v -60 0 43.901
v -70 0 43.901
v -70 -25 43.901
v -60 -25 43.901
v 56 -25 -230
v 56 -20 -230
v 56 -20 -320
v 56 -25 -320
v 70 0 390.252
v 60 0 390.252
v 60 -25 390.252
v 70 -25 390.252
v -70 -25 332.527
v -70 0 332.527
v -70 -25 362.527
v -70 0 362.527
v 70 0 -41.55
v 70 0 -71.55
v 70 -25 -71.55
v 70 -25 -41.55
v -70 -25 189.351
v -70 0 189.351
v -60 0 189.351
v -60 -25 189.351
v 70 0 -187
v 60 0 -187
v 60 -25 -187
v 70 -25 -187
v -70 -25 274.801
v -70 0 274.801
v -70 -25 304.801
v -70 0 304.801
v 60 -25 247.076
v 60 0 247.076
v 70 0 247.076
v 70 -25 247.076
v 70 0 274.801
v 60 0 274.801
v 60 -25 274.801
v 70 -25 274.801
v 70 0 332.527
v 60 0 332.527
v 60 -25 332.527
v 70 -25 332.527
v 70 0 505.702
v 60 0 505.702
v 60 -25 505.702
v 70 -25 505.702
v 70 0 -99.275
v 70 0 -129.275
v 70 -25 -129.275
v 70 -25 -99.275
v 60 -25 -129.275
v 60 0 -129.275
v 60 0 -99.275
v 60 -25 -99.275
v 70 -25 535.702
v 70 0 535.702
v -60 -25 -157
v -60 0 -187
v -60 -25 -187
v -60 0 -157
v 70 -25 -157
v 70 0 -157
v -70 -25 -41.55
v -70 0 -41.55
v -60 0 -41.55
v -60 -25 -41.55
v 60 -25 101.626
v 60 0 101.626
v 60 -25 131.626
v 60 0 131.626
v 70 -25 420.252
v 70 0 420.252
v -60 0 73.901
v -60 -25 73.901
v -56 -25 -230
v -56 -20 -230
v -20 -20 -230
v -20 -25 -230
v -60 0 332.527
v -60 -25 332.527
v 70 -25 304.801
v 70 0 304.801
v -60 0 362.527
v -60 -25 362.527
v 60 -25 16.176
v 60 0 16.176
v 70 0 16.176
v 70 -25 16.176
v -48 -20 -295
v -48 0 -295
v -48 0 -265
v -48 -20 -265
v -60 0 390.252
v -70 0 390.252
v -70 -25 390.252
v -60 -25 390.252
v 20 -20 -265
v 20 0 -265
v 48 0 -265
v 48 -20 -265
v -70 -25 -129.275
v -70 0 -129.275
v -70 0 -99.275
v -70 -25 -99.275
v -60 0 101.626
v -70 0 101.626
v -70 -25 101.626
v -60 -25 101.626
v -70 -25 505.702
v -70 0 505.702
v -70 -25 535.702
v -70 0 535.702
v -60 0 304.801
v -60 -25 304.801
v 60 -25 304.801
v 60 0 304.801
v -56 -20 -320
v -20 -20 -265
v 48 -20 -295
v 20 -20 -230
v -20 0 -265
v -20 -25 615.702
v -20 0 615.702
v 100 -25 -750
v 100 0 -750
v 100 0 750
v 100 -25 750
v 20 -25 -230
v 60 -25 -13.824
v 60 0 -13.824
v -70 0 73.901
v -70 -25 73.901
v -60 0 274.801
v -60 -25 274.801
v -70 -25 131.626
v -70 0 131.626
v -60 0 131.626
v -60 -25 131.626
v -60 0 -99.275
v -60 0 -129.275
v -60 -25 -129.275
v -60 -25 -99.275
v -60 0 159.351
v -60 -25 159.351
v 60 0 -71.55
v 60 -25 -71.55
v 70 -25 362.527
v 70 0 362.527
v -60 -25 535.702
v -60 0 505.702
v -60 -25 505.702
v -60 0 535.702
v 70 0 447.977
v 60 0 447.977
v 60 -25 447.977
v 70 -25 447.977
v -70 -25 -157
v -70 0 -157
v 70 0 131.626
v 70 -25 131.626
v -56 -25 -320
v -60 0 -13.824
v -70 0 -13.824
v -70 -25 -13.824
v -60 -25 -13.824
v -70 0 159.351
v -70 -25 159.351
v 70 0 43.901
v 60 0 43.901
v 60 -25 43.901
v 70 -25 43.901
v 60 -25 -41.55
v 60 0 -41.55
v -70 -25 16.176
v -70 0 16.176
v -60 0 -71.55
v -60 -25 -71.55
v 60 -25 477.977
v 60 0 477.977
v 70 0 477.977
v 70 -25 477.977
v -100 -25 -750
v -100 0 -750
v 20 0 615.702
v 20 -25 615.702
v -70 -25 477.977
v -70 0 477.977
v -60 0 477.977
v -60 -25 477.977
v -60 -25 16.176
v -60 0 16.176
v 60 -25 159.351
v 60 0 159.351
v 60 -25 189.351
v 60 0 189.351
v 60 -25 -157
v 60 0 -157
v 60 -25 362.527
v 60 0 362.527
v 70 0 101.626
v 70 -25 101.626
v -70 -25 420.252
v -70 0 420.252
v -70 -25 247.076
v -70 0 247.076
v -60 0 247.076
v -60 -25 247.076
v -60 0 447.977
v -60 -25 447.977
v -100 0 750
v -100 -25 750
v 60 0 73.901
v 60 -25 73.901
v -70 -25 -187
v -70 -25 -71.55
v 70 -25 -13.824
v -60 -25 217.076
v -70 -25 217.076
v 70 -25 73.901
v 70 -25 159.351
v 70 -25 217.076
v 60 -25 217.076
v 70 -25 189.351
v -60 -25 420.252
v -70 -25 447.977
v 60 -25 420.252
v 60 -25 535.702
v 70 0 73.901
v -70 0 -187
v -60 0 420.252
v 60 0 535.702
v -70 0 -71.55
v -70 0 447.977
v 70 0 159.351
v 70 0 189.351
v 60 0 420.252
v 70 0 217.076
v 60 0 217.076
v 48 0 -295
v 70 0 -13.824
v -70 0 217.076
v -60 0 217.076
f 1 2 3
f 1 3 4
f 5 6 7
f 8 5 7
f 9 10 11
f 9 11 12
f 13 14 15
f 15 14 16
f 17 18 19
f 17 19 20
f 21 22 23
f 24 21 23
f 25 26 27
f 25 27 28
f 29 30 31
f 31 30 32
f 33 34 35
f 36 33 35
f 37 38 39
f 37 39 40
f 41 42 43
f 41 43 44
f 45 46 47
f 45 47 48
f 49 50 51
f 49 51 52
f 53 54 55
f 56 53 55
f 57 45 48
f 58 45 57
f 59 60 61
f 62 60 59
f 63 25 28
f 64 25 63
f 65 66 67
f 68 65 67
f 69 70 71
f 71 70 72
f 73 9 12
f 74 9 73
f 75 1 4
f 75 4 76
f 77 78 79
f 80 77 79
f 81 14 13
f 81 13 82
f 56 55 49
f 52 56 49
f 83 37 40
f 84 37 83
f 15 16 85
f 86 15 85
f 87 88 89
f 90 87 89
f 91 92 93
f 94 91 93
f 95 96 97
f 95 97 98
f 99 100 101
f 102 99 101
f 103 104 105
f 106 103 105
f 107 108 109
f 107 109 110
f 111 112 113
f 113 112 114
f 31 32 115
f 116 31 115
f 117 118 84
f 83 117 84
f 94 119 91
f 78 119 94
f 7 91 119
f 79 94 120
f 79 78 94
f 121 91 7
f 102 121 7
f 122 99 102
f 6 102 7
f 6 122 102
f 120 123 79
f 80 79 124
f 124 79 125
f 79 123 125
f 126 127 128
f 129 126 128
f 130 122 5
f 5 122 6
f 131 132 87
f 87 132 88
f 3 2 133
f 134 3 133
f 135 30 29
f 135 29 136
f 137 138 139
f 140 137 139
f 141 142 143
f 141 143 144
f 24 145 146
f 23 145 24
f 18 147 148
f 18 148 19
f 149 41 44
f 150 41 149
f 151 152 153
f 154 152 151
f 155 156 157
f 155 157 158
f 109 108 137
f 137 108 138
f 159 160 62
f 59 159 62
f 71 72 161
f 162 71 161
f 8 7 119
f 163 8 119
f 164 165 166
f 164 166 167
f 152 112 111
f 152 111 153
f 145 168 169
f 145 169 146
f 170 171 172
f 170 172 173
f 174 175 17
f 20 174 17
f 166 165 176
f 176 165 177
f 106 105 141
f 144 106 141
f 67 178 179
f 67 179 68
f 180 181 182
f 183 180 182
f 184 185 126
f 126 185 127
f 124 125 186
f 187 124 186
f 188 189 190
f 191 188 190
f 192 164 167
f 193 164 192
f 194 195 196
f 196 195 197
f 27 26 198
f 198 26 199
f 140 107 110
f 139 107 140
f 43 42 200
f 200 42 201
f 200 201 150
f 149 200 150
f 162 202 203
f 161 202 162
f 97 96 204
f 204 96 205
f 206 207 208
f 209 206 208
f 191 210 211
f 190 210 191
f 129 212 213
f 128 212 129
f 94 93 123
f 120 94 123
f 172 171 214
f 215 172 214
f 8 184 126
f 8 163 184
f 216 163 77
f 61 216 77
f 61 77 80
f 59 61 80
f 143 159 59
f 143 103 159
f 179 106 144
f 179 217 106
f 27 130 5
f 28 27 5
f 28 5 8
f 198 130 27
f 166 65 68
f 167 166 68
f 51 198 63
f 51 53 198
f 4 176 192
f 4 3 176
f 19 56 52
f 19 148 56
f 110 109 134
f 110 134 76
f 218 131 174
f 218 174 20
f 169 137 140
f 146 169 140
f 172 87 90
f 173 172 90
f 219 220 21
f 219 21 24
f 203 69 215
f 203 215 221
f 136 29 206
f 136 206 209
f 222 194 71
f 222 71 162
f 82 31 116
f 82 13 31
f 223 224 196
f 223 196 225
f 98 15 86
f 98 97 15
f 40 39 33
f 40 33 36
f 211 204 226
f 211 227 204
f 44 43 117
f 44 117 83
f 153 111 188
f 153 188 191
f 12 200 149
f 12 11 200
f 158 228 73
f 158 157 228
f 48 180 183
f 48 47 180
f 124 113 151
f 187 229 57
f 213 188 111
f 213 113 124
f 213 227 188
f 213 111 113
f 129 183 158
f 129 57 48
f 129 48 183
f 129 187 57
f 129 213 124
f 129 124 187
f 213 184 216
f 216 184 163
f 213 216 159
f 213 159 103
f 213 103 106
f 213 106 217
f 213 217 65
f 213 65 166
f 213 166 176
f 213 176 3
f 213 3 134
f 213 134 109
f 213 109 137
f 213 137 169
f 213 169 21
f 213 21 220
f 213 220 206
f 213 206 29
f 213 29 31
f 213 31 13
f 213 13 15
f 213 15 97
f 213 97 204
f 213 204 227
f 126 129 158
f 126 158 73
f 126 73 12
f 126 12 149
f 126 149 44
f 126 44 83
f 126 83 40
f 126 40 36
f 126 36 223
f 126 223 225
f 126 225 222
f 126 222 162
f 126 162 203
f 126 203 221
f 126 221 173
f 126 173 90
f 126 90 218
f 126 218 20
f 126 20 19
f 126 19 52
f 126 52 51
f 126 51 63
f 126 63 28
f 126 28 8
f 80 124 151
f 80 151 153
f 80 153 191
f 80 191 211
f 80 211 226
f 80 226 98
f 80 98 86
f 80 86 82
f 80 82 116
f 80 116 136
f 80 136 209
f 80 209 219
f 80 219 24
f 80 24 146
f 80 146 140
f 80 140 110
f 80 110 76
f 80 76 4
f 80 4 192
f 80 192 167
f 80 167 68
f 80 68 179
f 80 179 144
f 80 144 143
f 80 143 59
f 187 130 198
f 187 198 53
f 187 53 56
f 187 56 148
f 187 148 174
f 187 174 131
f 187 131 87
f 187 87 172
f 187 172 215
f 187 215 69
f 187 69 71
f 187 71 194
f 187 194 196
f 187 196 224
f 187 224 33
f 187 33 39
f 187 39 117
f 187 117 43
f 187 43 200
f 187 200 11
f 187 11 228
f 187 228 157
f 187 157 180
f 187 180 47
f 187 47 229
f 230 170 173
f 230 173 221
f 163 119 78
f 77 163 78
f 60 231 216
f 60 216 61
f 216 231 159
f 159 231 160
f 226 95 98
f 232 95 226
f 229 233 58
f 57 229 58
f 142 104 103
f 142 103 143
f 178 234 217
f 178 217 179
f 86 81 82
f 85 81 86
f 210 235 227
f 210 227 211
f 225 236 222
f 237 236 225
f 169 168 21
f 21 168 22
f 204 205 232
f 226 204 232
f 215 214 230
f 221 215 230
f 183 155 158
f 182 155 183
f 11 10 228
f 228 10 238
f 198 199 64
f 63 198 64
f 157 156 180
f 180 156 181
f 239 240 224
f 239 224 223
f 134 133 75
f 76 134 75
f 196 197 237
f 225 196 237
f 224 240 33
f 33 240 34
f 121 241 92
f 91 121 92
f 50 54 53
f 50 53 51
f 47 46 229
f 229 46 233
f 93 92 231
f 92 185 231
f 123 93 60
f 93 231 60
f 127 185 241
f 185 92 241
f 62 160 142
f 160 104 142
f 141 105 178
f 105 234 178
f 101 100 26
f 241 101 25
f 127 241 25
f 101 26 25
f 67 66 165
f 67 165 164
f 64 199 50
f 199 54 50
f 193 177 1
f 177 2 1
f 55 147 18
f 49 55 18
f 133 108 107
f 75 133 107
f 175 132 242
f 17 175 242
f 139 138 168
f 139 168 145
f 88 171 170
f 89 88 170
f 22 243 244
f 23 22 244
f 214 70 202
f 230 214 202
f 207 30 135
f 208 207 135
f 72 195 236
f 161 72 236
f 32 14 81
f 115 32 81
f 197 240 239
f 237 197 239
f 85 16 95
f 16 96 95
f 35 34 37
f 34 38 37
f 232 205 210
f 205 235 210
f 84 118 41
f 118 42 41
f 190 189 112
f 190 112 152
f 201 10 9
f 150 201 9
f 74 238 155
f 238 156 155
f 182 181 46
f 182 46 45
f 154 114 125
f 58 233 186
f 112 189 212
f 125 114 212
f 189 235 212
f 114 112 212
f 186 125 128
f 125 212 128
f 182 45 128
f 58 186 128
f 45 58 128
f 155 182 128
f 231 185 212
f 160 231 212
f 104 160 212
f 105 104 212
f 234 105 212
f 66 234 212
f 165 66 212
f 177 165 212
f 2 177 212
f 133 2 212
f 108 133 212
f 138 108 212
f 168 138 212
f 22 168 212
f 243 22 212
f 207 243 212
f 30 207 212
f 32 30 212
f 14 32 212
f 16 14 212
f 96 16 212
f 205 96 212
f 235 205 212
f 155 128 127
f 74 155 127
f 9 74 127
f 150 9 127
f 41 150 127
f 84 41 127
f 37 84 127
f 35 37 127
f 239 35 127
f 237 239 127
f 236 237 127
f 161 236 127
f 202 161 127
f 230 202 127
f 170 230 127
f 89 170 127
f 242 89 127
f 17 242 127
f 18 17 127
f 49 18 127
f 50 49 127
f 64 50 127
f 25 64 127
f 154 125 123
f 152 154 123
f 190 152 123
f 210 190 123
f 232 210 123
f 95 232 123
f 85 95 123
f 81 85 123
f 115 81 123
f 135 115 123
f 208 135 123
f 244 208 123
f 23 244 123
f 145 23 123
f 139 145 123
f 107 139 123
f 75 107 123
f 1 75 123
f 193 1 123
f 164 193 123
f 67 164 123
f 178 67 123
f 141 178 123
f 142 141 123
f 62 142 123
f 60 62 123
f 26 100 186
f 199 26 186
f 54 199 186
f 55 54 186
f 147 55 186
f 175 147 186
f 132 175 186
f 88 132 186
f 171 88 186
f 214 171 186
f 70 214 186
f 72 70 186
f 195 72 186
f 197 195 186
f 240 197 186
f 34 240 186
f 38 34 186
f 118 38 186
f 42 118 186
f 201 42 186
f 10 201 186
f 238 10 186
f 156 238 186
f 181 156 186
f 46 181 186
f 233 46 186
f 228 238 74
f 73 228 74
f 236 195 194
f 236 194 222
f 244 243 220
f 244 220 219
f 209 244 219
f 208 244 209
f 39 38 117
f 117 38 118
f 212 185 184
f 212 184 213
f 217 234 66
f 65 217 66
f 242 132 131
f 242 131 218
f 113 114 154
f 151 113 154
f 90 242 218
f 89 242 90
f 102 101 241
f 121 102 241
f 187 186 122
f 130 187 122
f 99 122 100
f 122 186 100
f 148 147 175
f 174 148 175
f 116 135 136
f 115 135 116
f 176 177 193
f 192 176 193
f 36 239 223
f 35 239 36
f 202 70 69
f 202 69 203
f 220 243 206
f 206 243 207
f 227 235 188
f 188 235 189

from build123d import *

# Parameters (mm, degrees)
F0_W     = 200
F0_H     = 1500
F0_W_2   = 10
F0_H_2   = 30
F1_DEPTH = 25
F2_DEPTH = 20


with BuildPart() as f1:
    # F0 (on Front) → F1 (new body)
    with BuildSketch(Plane.XZ):
        Rectangle(F0_W, F0_H)
        with Locations((-65, -172)):
            Rectangle(F0_W_2, F0_H_2, mode=Mode.SUBTRACT)
        with Locations((-65, -114.274818)):
            Rectangle(F0_W_2, F0_H_2, mode=Mode.SUBTRACT)
        with Locations((-65, -56.549635)):
            Rectangle(F0_W_2, F0_H_2, mode=Mode.SUBTRACT)
        with Locations((65, -172)):
            Rectangle(F0_W_2, F0_H_2, mode=Mode.SUBTRACT)
        with Locations((65, -114.274818)):
            Rectangle(F0_W_2, F0_H_2, mode=Mode.SUBTRACT)
        with Locations((65, -56.549635)):
            Rectangle(F0_W_2, F0_H_2, mode=Mode.SUBTRACT)
        with Locations((-65, 1.175547)):
            Rectangle(F0_W_2, F0_H_2, mode=Mode.SUBTRACT)
        with Locations((-65, 58.90073)):
            Rectangle(F0_W_2, F0_H_2, mode=Mode.SUBTRACT)
        with Locations((-65, 116.625912)):
            Rectangle(F0_W_2, F0_H_2, mode=Mode.SUBTRACT)
        with Locations((-65, 174.351094)):
            Rectangle(F0_W_2, F0_H_2, mode=Mode.SUBTRACT)
        with Locations((-65, 232.076277)):
            Rectangle(F0_W_2, F0_H_2, mode=Mode.SUBTRACT)
        with Locations((-65, 289.801459)):
            Rectangle(F0_W_2, F0_H_2, mode=Mode.SUBTRACT)
        with Locations((-65, 347.526642)):
            Rectangle(F0_W_2, F0_H_2, mode=Mode.SUBTRACT)
        with Locations((-65, 405.251824)):
            Rectangle(F0_W_2, F0_H_2, mode=Mode.SUBTRACT)
        with Locations((-65, 462.977007)):
            Rectangle(F0_W_2, F0_H_2, mode=Mode.SUBTRACT)
        with Locations((-65, 520.702189)):
            Rectangle(F0_W_2, F0_H_2, mode=Mode.SUBTRACT)
        Polygon((-56, -230), (-20, -230), (-20, 615.702189), (20, 615.702189), (20, -230), (56, -230), (56, -320), (-56, -320), align=None, mode=Mode.SUBTRACT)
        with Locations((65, 1.175547)):
            Rectangle(F0_W_2, F0_H_2, mode=Mode.SUBTRACT)
        with Locations((65, 58.90073)):
            Rectangle(F0_W_2, F0_H_2, mode=Mode.SUBTRACT)
        with Locations((65, 116.625912)):
            Rectangle(F0_W_2, F0_H_2, mode=Mode.SUBTRACT)
        with Locations((65, 174.351094)):
            Rectangle(F0_W_2, F0_H_2, mode=Mode.SUBTRACT)
        with Locations((65, 232.076277)):
            Rectangle(F0_W_2, F0_H_2, mode=Mode.SUBTRACT)
        with Locations((65, 289.801459)):
            Rectangle(F0_W_2, F0_H_2, mode=Mode.SUBTRACT)
        with Locations((65, 347.526642)):
            Rectangle(F0_W_2, F0_H_2, mode=Mode.SUBTRACT)
        with Locations((65, 405.251824)):
            Rectangle(F0_W_2, F0_H_2, mode=Mode.SUBTRACT)
        with Locations((65, 462.977007)):
            Rectangle(F0_W_2, F0_H_2, mode=Mode.SUBTRACT)
        with Locations((65, 520.702189)):
            Rectangle(F0_W_2, F0_H_2, mode=Mode.SUBTRACT)
    extrude(amount=F1_DEPTH)

    # F0 (on Front) → F2 (join)
    with BuildSketch(Plane.XZ):
        Polygon((-20, -265), (-20, -230), (-56, -230), (-56, -320), (56, -320), (56, -230), (20, -230), (20, -265), (48, -265), (48, -295), (-48, -295), (-48, -265), align=None)
    extrude(amount=F2_DEPTH)


solid = f1.part
